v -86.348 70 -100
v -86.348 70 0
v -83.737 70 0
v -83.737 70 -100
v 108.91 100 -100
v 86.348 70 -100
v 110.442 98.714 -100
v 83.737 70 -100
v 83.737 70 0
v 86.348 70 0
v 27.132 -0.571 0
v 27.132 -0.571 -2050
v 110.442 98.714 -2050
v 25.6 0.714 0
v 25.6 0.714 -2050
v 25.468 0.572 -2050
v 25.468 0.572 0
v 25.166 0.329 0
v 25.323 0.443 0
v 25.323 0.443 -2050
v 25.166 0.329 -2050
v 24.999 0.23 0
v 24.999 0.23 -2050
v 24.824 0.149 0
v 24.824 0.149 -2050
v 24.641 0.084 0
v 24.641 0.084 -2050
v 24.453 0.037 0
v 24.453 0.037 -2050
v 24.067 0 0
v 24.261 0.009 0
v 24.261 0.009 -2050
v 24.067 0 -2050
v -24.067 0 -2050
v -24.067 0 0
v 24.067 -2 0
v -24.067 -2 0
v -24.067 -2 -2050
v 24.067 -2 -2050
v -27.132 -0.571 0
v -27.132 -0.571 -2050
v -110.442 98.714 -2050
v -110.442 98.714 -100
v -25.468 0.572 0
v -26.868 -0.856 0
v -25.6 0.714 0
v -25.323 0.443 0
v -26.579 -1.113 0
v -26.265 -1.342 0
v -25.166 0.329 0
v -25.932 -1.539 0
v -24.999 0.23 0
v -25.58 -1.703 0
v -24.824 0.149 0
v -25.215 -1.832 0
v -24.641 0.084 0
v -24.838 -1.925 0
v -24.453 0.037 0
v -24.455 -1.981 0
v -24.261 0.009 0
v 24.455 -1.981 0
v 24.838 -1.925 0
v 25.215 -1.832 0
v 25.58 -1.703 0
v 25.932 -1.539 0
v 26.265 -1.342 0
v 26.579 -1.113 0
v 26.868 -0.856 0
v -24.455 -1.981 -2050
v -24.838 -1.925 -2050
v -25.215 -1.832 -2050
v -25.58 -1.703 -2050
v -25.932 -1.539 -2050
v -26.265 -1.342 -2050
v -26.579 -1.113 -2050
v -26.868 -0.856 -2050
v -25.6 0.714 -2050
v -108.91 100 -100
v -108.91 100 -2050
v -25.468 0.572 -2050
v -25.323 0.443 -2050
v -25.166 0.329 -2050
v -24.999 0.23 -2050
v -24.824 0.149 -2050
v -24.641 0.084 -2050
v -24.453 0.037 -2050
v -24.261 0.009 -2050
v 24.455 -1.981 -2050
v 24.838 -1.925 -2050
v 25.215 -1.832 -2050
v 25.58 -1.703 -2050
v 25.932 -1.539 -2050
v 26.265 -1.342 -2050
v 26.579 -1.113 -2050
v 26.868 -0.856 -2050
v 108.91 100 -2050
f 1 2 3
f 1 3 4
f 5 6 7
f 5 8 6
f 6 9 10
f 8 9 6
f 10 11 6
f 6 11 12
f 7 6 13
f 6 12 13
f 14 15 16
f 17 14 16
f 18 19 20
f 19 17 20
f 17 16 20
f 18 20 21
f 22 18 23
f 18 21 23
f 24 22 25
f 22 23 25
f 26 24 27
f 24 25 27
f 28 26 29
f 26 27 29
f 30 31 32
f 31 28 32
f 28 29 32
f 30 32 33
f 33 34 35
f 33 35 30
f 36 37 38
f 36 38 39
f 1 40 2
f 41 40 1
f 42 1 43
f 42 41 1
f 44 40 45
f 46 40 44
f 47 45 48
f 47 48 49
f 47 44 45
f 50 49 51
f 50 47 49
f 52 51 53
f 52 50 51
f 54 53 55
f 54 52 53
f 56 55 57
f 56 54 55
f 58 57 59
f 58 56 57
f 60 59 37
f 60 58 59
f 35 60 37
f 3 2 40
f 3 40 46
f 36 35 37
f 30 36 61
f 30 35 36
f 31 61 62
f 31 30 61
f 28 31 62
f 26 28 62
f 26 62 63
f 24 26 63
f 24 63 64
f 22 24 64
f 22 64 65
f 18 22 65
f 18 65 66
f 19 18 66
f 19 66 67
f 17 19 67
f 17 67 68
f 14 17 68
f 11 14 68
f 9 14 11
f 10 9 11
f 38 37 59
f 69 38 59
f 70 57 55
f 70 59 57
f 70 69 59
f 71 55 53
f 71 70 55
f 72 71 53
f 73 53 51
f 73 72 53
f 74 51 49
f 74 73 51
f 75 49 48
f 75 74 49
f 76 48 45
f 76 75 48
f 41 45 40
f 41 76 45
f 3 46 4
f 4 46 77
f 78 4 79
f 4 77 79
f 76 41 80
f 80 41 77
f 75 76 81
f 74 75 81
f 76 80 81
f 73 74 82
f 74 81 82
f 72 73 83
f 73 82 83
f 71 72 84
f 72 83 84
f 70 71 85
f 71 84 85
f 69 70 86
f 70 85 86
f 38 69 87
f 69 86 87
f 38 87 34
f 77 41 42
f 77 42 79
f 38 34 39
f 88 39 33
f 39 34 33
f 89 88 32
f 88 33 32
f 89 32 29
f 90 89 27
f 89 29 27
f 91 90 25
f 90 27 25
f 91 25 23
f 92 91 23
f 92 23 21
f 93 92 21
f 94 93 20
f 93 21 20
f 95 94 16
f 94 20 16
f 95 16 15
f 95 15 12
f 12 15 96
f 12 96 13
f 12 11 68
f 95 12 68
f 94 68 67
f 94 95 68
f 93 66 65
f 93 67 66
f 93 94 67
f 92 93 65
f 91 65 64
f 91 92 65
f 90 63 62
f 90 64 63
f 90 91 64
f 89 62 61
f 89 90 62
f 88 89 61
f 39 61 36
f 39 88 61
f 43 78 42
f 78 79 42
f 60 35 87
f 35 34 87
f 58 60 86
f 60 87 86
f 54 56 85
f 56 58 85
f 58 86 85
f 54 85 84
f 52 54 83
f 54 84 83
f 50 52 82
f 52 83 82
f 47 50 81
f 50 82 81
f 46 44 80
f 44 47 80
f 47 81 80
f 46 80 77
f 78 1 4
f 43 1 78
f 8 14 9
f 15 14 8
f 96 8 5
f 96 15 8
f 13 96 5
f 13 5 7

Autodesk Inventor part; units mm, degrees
ref_plane "YZ Plane" through (0, 0, 0) normal (1, 0, 0) x (0, 1, 0)
ref_plane "XZ Plane" through (0, 0, 0) normal (0, 1, 0) x (-1, 0, 0)
ref_plane "XY Plane" through (0, 0, 0) normal (0, 0, 1) x (1, 0, 0)
sketch "Sketch4" plane through (0, 0, 0) normal (0, 0, 1) x (1, 0, 0)
  line L0 (-25, 0) -> (-24.0674, 0) construction
  line L1 (25, 0) -> (25.5995, 0.7144) construction
  line L2 (-25, 0) -> (-25.5995, 0.7144) construction
  line L3 (-108.91, 100) -> (108.91, 100) construction
  arc A0 (-25.5995, 0.7144) -> (-24.0674, 0) centre (-24.0674, 2) ccw
  arc A1 (24.0674, 0) -> (25.5995, 0.7144) centre (24.0674, 2) ccw
  line L4 (24.0674, 0) -> (25, 0) construction
  line L5 (25.5995, 0.7144) -> (108.91, 100)
  line L6 (-25.5995, 0.7144) -> (-108.91, 100)
  line L7 (-24.0674, 0) -> (24.0674, 0)
  point P0 (0, 0)
  point P1 (0, 0)
  point P2 (0, 100)
  point P3 (0, 0)
  dimension "d14" = 217.8199
  dimension "d15" = 50
  dimension "d16" = 100
  dimension "d17" = 2
  dimension "d39" = 130
contour flange "Contour Flange2" sketch "Sketch4" thickness 2 bend radius 2 width 2050 along (0, 0, -1) mid plane no both sides no wall seen from (-67.2547, 50.3572, 0) lies toward (-0.7660444, -0.6427876, 0) curves L6 A0 L7 A1 L5
bend "Bend4"
corner "Corner4"
sketch "Sketch6" plane through (0, 0, 0) normal (1, 0, 0) x (0, 1, 0)
  line L0 (100, -2050) -> (100, 0) projected
  line L1 (-0.5712, 0) -> (98.7144, 0) projected
  line L2 (98.7144, 0) -> (98.7144, -2050) projected
  line L3 (98.7144, 0) -> (100, 0)
  line L4 (70, 0) -> (70, -100)
  line L5 (70, -100) -> (100, -100)
  point P0 (0, 0)
  dimension "d51" = 30
  dimension "d52" = 100
extrude "Extrusion1" cut sketch "Sketch6" along normal through all both and the other way through all
equation "\"d15\" = Лоток_ширина_низ"
equation "\"d16\" = Лоток_высота"
equation "\"d17\" = BendRadius"
equation "\"d39\" = Лоток_угол"
equation "\"d51\" = Лоток_глубина_выреза"
equation "\"d40\" = Thickness"
equation "\"d41\" = BendReliefWidth"
equation "\"d42\" = BendReliefDepth"
equation "\"d43\" = MinimumRemnant"
equation "\"d44\" = TransitionRadius"
equation "\"d46\" = BendRadius"
equation "\"d48\" = CornerReliefSize"
equation "\"d49\" = GapSize"
equation "\"d50\" = JacobiRadiusSize"
equation "\"BendRadius\" = Thickness"
equation "\"BendReliefWidth\" = Thickness"
equation "\"BendReliefDepth\" = 0.5 * Thickness"
equation "\"CornerReliefSize\" = 4 * Thickness"
equation "\"MinimumRemnant\" = 2 * Thickness"
equation "\"TransitionRadius\" = BendRadius"
equation "\"JacobiRadiusSize\" = BendRadius"
equation "\"GapSize\" = Thickness"
equation "\"Лоток_ширина_низ\" = 50"
equation "\"Лоток_высота\" = 100"
equation "\"Лоток_угол\" = 130deg"
equation "\"Лоток_глубина_выреза\" = 30"
equation "\"Thickness\" = 2"
properties part number "ДМФ 051 лоток илоотвод"
